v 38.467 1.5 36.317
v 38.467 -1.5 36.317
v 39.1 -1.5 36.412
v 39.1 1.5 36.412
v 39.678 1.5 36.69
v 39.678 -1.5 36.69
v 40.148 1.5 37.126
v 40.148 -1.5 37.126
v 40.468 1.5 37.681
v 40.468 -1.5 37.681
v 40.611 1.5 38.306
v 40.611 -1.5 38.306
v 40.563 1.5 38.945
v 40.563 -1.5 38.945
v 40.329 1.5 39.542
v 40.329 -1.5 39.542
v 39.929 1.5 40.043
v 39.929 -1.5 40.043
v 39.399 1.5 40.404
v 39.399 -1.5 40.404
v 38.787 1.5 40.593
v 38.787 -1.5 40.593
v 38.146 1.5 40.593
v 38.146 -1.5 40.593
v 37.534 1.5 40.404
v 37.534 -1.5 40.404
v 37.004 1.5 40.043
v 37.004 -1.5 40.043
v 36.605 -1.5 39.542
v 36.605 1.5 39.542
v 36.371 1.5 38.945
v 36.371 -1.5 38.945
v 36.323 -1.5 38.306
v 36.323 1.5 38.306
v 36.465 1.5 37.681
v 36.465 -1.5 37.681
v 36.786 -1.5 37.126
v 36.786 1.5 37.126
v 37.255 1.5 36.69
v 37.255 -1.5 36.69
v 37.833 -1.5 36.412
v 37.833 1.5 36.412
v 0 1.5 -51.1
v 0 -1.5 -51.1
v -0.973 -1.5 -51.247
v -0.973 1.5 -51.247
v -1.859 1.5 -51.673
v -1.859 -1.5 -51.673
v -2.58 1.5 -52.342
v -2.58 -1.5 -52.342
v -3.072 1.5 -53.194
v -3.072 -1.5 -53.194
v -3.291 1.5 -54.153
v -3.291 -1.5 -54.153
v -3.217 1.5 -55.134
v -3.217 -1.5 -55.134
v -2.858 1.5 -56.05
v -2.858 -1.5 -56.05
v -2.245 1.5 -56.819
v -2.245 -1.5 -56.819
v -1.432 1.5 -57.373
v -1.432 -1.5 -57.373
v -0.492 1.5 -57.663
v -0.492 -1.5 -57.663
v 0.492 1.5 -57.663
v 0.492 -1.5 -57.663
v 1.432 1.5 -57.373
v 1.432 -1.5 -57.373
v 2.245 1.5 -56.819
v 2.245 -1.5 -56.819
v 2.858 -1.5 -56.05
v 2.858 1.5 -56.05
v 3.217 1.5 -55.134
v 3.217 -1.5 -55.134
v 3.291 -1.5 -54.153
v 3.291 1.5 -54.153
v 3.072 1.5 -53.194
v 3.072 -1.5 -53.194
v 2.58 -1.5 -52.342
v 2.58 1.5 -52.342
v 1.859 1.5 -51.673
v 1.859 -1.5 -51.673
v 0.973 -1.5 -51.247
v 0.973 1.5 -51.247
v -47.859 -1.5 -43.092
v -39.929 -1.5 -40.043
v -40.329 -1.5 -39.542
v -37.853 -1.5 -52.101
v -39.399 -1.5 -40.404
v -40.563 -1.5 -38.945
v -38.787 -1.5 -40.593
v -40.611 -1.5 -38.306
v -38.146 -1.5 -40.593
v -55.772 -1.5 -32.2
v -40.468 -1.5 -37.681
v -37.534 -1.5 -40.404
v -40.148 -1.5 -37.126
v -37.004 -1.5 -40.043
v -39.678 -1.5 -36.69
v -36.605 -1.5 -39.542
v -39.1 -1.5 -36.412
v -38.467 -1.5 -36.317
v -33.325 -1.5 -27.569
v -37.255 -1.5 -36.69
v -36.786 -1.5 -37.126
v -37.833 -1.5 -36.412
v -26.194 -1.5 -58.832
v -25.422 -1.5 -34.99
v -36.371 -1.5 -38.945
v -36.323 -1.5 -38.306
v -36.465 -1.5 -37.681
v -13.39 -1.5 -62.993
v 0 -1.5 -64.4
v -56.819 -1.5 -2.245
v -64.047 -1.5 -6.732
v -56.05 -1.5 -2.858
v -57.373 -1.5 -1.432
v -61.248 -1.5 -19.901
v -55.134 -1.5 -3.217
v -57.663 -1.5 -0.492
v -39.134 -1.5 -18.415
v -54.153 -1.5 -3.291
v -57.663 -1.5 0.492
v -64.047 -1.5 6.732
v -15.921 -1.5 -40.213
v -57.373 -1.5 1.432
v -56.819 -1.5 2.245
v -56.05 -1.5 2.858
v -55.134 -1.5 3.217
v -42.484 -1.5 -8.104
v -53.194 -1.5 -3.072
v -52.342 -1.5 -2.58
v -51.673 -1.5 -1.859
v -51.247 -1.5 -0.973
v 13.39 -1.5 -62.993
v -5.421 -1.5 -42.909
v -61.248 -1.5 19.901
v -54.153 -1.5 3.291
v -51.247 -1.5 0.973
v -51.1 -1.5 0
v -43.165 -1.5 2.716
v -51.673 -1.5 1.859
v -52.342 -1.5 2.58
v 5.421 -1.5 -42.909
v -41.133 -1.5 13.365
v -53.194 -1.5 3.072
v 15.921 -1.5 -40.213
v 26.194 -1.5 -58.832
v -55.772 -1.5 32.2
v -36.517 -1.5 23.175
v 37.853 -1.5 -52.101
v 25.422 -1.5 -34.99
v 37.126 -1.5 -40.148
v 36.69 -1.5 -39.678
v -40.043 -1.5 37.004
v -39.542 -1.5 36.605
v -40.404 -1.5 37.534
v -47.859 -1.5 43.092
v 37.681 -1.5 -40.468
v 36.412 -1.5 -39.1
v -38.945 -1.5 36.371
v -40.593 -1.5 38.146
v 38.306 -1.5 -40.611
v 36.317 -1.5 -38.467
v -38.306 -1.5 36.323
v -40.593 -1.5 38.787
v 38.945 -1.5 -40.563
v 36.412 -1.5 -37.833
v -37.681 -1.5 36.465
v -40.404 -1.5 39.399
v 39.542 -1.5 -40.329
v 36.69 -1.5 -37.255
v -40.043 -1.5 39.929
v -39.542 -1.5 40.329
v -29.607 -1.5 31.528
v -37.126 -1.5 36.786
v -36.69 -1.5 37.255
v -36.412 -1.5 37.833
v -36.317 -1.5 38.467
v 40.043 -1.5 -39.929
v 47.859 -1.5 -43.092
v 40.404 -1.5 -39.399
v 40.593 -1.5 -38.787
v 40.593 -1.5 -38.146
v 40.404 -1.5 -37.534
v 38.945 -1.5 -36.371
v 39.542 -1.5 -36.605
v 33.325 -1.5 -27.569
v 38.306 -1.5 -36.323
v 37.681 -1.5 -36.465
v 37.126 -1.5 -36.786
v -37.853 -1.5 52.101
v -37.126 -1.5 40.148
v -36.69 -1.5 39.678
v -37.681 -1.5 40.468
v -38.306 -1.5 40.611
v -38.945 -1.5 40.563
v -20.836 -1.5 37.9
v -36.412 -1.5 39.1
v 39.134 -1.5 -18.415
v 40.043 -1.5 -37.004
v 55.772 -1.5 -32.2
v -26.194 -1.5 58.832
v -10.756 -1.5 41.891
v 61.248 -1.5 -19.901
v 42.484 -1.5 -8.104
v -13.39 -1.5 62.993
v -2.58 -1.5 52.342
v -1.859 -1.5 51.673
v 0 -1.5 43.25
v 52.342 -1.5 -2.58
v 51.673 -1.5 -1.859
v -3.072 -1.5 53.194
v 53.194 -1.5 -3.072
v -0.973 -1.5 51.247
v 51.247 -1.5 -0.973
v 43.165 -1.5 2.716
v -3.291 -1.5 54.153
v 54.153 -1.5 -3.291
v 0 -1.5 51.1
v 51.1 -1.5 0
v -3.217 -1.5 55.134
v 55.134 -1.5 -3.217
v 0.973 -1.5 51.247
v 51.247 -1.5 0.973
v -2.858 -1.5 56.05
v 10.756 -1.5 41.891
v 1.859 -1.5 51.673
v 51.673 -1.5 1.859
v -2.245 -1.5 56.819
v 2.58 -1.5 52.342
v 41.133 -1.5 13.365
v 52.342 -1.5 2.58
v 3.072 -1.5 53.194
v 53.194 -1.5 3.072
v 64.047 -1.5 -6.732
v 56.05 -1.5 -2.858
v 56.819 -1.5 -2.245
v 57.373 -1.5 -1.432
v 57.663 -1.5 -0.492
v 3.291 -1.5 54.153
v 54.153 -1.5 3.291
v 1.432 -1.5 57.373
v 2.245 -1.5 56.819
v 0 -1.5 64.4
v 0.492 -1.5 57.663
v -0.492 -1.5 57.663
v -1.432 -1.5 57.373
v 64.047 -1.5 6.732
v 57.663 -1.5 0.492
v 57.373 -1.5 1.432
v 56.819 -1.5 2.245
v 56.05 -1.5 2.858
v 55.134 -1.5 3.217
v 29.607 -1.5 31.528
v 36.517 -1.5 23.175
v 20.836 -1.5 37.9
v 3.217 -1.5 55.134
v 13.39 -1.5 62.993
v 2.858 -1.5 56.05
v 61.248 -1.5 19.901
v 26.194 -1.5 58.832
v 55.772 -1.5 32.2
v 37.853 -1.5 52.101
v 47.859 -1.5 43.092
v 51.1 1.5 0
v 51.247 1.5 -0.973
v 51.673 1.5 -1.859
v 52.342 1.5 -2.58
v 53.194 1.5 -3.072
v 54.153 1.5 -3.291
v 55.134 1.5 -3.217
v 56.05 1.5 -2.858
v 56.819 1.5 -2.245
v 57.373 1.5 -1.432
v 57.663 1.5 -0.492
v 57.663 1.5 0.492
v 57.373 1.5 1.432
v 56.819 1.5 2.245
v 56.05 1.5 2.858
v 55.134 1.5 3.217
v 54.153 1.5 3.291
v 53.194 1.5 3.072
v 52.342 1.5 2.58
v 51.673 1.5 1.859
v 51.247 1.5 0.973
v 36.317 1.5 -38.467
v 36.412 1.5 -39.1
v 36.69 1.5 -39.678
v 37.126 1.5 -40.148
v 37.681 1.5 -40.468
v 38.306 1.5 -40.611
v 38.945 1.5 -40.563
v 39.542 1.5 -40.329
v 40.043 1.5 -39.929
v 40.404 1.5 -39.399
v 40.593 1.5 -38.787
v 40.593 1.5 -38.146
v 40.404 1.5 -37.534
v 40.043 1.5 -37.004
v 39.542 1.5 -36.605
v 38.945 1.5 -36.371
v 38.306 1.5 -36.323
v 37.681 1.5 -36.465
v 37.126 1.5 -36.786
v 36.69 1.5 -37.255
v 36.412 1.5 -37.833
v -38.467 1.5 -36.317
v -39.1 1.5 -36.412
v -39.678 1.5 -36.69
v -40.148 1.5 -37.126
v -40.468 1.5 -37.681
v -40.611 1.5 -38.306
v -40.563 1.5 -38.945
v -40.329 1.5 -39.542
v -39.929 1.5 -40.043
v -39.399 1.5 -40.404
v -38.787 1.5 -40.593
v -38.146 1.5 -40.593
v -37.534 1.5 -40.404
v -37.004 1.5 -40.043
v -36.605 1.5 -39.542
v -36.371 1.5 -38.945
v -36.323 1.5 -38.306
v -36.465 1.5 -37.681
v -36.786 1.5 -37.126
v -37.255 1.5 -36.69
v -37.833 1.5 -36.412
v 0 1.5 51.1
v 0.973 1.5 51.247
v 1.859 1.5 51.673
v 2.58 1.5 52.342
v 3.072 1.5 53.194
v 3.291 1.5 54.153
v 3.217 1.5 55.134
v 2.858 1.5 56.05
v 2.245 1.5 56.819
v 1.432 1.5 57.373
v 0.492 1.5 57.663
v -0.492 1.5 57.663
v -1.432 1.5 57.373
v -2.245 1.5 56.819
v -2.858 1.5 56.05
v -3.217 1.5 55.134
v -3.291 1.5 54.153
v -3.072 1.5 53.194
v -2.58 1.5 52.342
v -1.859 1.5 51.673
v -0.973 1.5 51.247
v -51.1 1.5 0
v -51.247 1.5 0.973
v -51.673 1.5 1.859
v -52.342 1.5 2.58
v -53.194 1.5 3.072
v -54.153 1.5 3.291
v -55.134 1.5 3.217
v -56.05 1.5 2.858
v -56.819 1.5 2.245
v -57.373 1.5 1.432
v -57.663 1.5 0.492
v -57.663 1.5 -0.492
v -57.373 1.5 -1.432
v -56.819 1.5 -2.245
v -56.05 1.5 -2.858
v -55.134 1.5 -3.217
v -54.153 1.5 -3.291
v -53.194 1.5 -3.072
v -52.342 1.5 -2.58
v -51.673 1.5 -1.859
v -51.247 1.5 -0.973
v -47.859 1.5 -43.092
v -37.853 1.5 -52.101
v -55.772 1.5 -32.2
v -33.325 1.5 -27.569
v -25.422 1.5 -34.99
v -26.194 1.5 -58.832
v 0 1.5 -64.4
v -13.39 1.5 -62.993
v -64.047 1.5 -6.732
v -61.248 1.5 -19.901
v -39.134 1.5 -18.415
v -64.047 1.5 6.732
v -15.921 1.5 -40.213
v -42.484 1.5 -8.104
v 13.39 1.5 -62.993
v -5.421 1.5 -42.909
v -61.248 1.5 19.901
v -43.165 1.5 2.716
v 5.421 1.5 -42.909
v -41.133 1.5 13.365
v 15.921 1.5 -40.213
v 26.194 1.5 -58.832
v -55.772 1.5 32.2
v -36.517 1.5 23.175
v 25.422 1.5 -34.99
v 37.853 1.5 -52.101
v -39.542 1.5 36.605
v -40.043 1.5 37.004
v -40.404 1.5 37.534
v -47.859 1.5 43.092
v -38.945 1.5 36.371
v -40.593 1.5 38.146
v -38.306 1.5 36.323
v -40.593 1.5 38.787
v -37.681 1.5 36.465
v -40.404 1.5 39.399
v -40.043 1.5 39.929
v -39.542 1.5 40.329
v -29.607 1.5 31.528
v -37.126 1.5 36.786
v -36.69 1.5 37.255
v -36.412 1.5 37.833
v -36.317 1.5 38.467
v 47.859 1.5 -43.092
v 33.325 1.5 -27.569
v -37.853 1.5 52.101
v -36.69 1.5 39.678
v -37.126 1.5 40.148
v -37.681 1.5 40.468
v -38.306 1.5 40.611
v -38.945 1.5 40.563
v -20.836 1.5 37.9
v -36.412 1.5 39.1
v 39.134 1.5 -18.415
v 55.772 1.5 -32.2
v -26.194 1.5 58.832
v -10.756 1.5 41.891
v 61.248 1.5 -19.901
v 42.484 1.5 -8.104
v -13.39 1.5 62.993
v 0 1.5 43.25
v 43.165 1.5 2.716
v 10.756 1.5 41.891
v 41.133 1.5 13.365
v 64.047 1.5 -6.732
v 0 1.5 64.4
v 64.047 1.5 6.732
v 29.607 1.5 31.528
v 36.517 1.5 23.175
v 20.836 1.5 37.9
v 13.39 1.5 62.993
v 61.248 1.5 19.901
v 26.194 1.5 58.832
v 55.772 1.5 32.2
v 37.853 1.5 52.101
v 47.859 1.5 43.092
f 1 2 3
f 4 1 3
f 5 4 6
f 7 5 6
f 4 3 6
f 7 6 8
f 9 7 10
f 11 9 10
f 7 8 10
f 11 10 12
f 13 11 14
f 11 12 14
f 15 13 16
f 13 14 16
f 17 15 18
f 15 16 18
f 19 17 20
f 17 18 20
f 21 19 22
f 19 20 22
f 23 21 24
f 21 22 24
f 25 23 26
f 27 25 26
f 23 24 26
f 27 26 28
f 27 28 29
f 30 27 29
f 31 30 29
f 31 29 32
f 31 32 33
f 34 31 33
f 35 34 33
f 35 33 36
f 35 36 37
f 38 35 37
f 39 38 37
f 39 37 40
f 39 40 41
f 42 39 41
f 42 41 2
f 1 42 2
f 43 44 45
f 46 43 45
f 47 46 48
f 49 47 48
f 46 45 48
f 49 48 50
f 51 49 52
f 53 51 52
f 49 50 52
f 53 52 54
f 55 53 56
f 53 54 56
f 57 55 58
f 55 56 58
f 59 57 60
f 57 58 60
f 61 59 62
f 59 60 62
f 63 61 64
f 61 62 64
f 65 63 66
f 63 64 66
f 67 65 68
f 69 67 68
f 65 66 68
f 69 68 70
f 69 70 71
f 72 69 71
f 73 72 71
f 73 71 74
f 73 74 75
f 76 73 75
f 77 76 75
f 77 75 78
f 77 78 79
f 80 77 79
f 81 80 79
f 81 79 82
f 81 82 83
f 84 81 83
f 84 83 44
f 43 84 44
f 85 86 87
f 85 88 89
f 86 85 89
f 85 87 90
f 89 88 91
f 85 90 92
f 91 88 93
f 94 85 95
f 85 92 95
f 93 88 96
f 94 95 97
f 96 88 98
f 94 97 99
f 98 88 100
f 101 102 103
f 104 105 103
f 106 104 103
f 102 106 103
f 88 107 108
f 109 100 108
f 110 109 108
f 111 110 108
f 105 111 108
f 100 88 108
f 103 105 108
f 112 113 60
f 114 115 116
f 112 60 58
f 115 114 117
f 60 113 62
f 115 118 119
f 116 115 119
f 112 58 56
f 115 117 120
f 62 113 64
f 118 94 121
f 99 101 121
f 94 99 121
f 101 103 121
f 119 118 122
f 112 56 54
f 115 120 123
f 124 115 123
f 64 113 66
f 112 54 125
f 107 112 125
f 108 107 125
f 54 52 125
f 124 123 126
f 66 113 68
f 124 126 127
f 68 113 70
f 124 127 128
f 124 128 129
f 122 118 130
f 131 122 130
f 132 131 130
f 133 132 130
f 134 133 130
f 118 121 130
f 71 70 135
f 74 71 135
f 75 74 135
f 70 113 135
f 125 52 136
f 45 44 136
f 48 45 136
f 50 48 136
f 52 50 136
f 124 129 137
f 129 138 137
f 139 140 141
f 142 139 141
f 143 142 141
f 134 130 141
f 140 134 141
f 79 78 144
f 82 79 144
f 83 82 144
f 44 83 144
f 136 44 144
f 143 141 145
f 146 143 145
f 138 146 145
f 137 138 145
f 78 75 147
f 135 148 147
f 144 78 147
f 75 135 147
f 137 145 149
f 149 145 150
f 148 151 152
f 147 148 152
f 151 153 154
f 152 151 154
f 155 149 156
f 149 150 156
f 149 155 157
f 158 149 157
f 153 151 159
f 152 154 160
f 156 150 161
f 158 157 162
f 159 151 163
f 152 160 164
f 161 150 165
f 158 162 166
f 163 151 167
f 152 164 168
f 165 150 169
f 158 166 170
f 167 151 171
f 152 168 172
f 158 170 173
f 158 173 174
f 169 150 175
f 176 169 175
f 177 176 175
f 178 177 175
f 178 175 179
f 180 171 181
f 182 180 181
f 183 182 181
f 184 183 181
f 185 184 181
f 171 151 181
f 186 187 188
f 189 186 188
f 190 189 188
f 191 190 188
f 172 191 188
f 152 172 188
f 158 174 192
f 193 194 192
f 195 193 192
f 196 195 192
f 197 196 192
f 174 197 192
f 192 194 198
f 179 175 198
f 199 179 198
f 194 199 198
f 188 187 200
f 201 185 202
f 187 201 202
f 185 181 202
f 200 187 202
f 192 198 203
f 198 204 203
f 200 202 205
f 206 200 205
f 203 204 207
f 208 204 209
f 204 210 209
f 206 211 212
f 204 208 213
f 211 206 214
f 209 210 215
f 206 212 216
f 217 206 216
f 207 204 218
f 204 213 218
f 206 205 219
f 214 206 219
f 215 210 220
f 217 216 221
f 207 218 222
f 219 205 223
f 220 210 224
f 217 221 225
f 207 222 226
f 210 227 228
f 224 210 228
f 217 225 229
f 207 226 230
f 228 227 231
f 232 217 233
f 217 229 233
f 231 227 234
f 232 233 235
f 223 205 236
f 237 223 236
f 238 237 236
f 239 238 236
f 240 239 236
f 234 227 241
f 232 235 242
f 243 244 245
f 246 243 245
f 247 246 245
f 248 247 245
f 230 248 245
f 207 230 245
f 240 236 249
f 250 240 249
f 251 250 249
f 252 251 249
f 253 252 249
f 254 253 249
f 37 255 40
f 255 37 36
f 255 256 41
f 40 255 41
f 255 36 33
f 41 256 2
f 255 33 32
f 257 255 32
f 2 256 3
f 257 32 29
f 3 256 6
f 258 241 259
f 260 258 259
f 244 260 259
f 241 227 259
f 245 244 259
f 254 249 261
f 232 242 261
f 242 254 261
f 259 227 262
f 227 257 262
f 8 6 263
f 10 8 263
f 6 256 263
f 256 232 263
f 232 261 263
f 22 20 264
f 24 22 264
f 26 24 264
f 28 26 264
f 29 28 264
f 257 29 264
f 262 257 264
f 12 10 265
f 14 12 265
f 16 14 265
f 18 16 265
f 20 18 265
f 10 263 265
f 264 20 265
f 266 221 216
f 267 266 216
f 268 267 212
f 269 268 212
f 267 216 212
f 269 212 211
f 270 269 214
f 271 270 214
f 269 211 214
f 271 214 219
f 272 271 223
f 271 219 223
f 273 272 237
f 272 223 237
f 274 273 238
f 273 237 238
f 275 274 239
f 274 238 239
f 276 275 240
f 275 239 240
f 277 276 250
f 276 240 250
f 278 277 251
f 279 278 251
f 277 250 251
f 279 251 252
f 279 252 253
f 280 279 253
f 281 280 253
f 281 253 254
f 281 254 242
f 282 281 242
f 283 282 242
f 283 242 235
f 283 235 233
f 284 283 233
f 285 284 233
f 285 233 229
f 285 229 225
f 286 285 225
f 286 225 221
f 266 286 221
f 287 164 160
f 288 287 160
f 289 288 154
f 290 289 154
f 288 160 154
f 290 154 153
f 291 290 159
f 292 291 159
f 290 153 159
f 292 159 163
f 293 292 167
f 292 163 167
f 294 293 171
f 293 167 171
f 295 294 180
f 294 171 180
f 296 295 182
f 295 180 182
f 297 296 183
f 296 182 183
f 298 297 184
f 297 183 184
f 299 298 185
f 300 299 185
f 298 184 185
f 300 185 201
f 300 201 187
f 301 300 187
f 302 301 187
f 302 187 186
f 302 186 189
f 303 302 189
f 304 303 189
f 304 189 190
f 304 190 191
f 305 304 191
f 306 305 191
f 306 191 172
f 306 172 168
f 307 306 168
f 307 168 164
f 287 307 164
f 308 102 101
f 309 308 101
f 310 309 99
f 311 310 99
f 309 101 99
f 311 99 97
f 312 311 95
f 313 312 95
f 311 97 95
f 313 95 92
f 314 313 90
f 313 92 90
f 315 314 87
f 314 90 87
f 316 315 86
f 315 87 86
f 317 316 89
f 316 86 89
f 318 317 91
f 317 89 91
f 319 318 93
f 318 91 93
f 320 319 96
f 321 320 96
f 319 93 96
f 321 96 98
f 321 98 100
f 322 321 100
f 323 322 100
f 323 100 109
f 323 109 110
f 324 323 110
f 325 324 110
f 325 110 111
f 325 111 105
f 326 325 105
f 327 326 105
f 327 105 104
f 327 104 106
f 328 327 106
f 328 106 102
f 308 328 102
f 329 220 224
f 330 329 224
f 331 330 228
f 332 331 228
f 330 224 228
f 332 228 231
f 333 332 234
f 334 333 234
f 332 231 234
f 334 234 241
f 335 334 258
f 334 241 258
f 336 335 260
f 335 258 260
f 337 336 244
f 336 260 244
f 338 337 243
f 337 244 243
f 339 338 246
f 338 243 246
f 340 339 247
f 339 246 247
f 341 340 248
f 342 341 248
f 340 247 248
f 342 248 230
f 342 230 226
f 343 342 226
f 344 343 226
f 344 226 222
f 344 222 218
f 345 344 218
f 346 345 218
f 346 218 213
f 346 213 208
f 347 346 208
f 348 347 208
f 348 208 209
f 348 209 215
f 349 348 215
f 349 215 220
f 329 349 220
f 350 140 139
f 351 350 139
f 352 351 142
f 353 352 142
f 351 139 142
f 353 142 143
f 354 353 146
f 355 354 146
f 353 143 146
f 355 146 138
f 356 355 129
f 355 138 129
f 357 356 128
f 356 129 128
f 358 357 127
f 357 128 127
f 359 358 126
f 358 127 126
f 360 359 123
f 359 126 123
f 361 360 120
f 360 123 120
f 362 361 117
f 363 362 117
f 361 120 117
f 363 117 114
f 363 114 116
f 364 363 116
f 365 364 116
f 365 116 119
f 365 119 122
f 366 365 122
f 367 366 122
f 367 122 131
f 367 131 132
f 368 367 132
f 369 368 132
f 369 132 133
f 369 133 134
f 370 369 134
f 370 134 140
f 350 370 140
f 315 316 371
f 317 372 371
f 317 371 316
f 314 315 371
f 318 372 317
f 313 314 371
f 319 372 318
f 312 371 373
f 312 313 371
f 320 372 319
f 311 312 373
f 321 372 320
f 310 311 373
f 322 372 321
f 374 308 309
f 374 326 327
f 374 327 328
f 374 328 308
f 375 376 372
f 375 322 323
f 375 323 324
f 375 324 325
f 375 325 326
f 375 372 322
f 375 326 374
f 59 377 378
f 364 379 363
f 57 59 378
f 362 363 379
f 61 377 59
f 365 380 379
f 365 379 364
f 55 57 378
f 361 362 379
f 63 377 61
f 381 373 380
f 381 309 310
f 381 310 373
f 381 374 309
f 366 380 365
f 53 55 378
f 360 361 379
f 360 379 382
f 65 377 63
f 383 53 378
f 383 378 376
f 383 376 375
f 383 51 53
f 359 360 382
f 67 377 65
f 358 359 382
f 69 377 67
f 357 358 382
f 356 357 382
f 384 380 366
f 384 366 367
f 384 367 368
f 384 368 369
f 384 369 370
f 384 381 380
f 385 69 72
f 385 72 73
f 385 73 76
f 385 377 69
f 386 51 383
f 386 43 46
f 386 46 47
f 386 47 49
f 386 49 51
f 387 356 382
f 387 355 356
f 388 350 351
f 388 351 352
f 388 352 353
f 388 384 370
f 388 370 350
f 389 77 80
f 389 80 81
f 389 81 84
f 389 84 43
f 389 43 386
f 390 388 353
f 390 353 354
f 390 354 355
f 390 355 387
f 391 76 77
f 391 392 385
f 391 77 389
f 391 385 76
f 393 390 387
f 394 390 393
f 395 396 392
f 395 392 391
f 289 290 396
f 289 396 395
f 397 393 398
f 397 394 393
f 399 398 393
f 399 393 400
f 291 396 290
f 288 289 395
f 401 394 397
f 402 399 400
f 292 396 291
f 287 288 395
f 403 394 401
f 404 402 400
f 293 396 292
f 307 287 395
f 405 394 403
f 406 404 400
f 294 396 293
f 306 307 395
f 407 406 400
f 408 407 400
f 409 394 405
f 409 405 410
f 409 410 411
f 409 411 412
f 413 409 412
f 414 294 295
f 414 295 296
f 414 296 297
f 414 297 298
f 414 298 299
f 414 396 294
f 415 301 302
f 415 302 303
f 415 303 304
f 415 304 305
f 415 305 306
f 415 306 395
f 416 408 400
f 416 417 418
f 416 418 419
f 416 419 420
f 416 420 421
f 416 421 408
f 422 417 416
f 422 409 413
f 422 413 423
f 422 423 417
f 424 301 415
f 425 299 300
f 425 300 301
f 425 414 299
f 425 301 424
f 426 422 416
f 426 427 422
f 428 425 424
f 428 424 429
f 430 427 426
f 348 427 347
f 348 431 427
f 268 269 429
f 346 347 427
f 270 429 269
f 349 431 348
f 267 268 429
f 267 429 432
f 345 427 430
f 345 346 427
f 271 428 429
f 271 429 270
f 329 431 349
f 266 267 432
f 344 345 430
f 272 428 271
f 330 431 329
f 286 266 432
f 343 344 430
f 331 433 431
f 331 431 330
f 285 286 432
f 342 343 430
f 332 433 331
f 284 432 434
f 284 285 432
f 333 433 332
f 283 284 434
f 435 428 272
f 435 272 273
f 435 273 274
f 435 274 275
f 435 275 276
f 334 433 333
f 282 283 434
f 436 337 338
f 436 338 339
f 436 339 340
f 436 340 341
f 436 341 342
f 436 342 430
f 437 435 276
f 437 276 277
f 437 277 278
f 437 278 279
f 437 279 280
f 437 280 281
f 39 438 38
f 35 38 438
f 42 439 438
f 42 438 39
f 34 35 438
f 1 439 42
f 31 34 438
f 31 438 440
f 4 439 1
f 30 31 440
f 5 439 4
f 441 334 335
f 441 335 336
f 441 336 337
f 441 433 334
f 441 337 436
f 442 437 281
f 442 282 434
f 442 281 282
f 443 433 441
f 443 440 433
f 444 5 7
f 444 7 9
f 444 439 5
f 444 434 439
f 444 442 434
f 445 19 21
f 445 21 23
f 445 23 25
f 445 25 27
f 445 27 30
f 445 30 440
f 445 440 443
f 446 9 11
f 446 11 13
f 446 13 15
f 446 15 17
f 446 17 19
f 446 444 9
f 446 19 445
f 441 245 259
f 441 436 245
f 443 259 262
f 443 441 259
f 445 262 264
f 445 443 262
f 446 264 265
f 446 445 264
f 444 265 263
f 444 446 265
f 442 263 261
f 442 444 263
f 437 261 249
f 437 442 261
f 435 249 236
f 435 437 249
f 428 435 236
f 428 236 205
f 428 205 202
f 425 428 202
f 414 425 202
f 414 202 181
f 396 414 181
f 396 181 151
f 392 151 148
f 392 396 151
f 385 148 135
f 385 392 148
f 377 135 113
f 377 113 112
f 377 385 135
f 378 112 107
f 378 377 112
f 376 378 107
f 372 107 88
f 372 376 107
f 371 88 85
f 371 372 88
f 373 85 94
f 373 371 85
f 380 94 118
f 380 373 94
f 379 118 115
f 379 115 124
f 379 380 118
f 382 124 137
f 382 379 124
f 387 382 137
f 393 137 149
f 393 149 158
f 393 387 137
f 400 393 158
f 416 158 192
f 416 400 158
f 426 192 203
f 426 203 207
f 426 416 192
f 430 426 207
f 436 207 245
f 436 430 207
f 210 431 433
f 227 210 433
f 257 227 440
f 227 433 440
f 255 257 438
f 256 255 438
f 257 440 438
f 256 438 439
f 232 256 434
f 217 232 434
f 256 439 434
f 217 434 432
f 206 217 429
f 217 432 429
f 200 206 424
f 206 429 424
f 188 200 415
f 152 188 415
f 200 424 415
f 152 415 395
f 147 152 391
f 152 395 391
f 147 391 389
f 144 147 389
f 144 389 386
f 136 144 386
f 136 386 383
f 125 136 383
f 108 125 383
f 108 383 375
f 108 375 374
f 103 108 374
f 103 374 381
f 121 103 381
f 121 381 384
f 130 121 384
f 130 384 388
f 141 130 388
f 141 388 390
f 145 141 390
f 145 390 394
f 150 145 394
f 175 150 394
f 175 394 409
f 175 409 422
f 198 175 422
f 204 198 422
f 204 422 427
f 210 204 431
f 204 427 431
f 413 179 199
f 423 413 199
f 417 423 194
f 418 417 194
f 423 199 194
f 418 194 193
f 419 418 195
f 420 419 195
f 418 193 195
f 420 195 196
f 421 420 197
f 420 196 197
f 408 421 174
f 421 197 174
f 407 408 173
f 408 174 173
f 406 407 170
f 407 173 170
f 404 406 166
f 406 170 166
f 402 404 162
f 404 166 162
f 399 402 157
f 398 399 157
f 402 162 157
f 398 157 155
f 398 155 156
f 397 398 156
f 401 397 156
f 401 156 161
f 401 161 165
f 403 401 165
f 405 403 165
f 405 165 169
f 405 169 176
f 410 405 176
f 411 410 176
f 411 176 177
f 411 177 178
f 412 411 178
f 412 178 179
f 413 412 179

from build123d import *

# Parameters (mm, degrees)
SKETCH1_R            = 64.4
BOSS_EXTRUDE1_DEPTH  = 1.5
M6_CLEARANCE_HOLE1_D = 6.6
CIRPATTERN2_COUNT    = 4
M4_CLEARANCE_HOLE1_D = 4.3
CIRPATTERN1_COUNT    = 4
SKETCH10_R           = 43.25
CUT_EXTRUDE1_DEPTH   = 92.124749657


with BuildPart() as part:
    # Sketch1 → Boss-Extrude1 (new, symmetric)
    with BuildSketch(Plane(origin=(0, 0, 0), x_dir=(1, 0, 0), z_dir=(0, 1, 0))):
        with Locations(Location((0, 0, 0), (0, 0, 270))):
            Circle(SKETCH1_R)
    extrude(amount=BOSS_EXTRUDE1_DEPTH, both=True)

    # M6 Clearance Hole1 (through all)
    with Locations(Plane(origin=(0, 1.5, 0), x_dir=(1, 0, 0), z_dir=(0, 1, 0))):
        with Locations((54.4, 0)):
            m6_clearance_hole1 = Hole(M6_CLEARANCE_HOLE1_D / 2)

    # CirPattern2: M6 Clearance Hole1 ×4 about axis
    cirpattern2_axis = Axis((0, 0, 0), (0, 1, 0))
    for i in range(1, CIRPATTERN2_COUNT):
        add(m6_clearance_hole1.rotate(cirpattern2_axis, i * 360 / CIRPATTERN2_COUNT), mode=Mode.SUBTRACT)

    # M4 Clearance Hole1 (through all)
    with Locations(Plane(origin=(0, 1.5, 0), x_dir=(1, 0, 0), z_dir=(0, 1, 0))):
        with Locations((38.466608897, 38.466608897)):
            m4_clearance_hole1 = Hole(M4_CLEARANCE_HOLE1_D / 2)

    # CirPattern1: M4 Clearance Hole1 ×4 about axis
    cirpattern1_axis = Axis((0, 0, 0), (0, 1, 0))
    for i in range(1, CIRPATTERN1_COUNT):
        add(m4_clearance_hole1.rotate(cirpattern1_axis, i * 360 / CIRPATTERN1_COUNT), mode=Mode.SUBTRACT)

    # Sketch10 → Cut-Extrude1 (cut, through all)
    with BuildSketch(Plane(origin=(0, 1.5, 0), x_dir=(1, 0, 0), z_dir=(0, 1, 0))):
        with Locations(Location((0, 0, 0), (0, 0, 270))):
            Circle(SKETCH10_R)
    extrude(amount=-CUT_EXTRUDE1_DEPTH, mode=Mode.SUBTRACT)


solid = part.part
